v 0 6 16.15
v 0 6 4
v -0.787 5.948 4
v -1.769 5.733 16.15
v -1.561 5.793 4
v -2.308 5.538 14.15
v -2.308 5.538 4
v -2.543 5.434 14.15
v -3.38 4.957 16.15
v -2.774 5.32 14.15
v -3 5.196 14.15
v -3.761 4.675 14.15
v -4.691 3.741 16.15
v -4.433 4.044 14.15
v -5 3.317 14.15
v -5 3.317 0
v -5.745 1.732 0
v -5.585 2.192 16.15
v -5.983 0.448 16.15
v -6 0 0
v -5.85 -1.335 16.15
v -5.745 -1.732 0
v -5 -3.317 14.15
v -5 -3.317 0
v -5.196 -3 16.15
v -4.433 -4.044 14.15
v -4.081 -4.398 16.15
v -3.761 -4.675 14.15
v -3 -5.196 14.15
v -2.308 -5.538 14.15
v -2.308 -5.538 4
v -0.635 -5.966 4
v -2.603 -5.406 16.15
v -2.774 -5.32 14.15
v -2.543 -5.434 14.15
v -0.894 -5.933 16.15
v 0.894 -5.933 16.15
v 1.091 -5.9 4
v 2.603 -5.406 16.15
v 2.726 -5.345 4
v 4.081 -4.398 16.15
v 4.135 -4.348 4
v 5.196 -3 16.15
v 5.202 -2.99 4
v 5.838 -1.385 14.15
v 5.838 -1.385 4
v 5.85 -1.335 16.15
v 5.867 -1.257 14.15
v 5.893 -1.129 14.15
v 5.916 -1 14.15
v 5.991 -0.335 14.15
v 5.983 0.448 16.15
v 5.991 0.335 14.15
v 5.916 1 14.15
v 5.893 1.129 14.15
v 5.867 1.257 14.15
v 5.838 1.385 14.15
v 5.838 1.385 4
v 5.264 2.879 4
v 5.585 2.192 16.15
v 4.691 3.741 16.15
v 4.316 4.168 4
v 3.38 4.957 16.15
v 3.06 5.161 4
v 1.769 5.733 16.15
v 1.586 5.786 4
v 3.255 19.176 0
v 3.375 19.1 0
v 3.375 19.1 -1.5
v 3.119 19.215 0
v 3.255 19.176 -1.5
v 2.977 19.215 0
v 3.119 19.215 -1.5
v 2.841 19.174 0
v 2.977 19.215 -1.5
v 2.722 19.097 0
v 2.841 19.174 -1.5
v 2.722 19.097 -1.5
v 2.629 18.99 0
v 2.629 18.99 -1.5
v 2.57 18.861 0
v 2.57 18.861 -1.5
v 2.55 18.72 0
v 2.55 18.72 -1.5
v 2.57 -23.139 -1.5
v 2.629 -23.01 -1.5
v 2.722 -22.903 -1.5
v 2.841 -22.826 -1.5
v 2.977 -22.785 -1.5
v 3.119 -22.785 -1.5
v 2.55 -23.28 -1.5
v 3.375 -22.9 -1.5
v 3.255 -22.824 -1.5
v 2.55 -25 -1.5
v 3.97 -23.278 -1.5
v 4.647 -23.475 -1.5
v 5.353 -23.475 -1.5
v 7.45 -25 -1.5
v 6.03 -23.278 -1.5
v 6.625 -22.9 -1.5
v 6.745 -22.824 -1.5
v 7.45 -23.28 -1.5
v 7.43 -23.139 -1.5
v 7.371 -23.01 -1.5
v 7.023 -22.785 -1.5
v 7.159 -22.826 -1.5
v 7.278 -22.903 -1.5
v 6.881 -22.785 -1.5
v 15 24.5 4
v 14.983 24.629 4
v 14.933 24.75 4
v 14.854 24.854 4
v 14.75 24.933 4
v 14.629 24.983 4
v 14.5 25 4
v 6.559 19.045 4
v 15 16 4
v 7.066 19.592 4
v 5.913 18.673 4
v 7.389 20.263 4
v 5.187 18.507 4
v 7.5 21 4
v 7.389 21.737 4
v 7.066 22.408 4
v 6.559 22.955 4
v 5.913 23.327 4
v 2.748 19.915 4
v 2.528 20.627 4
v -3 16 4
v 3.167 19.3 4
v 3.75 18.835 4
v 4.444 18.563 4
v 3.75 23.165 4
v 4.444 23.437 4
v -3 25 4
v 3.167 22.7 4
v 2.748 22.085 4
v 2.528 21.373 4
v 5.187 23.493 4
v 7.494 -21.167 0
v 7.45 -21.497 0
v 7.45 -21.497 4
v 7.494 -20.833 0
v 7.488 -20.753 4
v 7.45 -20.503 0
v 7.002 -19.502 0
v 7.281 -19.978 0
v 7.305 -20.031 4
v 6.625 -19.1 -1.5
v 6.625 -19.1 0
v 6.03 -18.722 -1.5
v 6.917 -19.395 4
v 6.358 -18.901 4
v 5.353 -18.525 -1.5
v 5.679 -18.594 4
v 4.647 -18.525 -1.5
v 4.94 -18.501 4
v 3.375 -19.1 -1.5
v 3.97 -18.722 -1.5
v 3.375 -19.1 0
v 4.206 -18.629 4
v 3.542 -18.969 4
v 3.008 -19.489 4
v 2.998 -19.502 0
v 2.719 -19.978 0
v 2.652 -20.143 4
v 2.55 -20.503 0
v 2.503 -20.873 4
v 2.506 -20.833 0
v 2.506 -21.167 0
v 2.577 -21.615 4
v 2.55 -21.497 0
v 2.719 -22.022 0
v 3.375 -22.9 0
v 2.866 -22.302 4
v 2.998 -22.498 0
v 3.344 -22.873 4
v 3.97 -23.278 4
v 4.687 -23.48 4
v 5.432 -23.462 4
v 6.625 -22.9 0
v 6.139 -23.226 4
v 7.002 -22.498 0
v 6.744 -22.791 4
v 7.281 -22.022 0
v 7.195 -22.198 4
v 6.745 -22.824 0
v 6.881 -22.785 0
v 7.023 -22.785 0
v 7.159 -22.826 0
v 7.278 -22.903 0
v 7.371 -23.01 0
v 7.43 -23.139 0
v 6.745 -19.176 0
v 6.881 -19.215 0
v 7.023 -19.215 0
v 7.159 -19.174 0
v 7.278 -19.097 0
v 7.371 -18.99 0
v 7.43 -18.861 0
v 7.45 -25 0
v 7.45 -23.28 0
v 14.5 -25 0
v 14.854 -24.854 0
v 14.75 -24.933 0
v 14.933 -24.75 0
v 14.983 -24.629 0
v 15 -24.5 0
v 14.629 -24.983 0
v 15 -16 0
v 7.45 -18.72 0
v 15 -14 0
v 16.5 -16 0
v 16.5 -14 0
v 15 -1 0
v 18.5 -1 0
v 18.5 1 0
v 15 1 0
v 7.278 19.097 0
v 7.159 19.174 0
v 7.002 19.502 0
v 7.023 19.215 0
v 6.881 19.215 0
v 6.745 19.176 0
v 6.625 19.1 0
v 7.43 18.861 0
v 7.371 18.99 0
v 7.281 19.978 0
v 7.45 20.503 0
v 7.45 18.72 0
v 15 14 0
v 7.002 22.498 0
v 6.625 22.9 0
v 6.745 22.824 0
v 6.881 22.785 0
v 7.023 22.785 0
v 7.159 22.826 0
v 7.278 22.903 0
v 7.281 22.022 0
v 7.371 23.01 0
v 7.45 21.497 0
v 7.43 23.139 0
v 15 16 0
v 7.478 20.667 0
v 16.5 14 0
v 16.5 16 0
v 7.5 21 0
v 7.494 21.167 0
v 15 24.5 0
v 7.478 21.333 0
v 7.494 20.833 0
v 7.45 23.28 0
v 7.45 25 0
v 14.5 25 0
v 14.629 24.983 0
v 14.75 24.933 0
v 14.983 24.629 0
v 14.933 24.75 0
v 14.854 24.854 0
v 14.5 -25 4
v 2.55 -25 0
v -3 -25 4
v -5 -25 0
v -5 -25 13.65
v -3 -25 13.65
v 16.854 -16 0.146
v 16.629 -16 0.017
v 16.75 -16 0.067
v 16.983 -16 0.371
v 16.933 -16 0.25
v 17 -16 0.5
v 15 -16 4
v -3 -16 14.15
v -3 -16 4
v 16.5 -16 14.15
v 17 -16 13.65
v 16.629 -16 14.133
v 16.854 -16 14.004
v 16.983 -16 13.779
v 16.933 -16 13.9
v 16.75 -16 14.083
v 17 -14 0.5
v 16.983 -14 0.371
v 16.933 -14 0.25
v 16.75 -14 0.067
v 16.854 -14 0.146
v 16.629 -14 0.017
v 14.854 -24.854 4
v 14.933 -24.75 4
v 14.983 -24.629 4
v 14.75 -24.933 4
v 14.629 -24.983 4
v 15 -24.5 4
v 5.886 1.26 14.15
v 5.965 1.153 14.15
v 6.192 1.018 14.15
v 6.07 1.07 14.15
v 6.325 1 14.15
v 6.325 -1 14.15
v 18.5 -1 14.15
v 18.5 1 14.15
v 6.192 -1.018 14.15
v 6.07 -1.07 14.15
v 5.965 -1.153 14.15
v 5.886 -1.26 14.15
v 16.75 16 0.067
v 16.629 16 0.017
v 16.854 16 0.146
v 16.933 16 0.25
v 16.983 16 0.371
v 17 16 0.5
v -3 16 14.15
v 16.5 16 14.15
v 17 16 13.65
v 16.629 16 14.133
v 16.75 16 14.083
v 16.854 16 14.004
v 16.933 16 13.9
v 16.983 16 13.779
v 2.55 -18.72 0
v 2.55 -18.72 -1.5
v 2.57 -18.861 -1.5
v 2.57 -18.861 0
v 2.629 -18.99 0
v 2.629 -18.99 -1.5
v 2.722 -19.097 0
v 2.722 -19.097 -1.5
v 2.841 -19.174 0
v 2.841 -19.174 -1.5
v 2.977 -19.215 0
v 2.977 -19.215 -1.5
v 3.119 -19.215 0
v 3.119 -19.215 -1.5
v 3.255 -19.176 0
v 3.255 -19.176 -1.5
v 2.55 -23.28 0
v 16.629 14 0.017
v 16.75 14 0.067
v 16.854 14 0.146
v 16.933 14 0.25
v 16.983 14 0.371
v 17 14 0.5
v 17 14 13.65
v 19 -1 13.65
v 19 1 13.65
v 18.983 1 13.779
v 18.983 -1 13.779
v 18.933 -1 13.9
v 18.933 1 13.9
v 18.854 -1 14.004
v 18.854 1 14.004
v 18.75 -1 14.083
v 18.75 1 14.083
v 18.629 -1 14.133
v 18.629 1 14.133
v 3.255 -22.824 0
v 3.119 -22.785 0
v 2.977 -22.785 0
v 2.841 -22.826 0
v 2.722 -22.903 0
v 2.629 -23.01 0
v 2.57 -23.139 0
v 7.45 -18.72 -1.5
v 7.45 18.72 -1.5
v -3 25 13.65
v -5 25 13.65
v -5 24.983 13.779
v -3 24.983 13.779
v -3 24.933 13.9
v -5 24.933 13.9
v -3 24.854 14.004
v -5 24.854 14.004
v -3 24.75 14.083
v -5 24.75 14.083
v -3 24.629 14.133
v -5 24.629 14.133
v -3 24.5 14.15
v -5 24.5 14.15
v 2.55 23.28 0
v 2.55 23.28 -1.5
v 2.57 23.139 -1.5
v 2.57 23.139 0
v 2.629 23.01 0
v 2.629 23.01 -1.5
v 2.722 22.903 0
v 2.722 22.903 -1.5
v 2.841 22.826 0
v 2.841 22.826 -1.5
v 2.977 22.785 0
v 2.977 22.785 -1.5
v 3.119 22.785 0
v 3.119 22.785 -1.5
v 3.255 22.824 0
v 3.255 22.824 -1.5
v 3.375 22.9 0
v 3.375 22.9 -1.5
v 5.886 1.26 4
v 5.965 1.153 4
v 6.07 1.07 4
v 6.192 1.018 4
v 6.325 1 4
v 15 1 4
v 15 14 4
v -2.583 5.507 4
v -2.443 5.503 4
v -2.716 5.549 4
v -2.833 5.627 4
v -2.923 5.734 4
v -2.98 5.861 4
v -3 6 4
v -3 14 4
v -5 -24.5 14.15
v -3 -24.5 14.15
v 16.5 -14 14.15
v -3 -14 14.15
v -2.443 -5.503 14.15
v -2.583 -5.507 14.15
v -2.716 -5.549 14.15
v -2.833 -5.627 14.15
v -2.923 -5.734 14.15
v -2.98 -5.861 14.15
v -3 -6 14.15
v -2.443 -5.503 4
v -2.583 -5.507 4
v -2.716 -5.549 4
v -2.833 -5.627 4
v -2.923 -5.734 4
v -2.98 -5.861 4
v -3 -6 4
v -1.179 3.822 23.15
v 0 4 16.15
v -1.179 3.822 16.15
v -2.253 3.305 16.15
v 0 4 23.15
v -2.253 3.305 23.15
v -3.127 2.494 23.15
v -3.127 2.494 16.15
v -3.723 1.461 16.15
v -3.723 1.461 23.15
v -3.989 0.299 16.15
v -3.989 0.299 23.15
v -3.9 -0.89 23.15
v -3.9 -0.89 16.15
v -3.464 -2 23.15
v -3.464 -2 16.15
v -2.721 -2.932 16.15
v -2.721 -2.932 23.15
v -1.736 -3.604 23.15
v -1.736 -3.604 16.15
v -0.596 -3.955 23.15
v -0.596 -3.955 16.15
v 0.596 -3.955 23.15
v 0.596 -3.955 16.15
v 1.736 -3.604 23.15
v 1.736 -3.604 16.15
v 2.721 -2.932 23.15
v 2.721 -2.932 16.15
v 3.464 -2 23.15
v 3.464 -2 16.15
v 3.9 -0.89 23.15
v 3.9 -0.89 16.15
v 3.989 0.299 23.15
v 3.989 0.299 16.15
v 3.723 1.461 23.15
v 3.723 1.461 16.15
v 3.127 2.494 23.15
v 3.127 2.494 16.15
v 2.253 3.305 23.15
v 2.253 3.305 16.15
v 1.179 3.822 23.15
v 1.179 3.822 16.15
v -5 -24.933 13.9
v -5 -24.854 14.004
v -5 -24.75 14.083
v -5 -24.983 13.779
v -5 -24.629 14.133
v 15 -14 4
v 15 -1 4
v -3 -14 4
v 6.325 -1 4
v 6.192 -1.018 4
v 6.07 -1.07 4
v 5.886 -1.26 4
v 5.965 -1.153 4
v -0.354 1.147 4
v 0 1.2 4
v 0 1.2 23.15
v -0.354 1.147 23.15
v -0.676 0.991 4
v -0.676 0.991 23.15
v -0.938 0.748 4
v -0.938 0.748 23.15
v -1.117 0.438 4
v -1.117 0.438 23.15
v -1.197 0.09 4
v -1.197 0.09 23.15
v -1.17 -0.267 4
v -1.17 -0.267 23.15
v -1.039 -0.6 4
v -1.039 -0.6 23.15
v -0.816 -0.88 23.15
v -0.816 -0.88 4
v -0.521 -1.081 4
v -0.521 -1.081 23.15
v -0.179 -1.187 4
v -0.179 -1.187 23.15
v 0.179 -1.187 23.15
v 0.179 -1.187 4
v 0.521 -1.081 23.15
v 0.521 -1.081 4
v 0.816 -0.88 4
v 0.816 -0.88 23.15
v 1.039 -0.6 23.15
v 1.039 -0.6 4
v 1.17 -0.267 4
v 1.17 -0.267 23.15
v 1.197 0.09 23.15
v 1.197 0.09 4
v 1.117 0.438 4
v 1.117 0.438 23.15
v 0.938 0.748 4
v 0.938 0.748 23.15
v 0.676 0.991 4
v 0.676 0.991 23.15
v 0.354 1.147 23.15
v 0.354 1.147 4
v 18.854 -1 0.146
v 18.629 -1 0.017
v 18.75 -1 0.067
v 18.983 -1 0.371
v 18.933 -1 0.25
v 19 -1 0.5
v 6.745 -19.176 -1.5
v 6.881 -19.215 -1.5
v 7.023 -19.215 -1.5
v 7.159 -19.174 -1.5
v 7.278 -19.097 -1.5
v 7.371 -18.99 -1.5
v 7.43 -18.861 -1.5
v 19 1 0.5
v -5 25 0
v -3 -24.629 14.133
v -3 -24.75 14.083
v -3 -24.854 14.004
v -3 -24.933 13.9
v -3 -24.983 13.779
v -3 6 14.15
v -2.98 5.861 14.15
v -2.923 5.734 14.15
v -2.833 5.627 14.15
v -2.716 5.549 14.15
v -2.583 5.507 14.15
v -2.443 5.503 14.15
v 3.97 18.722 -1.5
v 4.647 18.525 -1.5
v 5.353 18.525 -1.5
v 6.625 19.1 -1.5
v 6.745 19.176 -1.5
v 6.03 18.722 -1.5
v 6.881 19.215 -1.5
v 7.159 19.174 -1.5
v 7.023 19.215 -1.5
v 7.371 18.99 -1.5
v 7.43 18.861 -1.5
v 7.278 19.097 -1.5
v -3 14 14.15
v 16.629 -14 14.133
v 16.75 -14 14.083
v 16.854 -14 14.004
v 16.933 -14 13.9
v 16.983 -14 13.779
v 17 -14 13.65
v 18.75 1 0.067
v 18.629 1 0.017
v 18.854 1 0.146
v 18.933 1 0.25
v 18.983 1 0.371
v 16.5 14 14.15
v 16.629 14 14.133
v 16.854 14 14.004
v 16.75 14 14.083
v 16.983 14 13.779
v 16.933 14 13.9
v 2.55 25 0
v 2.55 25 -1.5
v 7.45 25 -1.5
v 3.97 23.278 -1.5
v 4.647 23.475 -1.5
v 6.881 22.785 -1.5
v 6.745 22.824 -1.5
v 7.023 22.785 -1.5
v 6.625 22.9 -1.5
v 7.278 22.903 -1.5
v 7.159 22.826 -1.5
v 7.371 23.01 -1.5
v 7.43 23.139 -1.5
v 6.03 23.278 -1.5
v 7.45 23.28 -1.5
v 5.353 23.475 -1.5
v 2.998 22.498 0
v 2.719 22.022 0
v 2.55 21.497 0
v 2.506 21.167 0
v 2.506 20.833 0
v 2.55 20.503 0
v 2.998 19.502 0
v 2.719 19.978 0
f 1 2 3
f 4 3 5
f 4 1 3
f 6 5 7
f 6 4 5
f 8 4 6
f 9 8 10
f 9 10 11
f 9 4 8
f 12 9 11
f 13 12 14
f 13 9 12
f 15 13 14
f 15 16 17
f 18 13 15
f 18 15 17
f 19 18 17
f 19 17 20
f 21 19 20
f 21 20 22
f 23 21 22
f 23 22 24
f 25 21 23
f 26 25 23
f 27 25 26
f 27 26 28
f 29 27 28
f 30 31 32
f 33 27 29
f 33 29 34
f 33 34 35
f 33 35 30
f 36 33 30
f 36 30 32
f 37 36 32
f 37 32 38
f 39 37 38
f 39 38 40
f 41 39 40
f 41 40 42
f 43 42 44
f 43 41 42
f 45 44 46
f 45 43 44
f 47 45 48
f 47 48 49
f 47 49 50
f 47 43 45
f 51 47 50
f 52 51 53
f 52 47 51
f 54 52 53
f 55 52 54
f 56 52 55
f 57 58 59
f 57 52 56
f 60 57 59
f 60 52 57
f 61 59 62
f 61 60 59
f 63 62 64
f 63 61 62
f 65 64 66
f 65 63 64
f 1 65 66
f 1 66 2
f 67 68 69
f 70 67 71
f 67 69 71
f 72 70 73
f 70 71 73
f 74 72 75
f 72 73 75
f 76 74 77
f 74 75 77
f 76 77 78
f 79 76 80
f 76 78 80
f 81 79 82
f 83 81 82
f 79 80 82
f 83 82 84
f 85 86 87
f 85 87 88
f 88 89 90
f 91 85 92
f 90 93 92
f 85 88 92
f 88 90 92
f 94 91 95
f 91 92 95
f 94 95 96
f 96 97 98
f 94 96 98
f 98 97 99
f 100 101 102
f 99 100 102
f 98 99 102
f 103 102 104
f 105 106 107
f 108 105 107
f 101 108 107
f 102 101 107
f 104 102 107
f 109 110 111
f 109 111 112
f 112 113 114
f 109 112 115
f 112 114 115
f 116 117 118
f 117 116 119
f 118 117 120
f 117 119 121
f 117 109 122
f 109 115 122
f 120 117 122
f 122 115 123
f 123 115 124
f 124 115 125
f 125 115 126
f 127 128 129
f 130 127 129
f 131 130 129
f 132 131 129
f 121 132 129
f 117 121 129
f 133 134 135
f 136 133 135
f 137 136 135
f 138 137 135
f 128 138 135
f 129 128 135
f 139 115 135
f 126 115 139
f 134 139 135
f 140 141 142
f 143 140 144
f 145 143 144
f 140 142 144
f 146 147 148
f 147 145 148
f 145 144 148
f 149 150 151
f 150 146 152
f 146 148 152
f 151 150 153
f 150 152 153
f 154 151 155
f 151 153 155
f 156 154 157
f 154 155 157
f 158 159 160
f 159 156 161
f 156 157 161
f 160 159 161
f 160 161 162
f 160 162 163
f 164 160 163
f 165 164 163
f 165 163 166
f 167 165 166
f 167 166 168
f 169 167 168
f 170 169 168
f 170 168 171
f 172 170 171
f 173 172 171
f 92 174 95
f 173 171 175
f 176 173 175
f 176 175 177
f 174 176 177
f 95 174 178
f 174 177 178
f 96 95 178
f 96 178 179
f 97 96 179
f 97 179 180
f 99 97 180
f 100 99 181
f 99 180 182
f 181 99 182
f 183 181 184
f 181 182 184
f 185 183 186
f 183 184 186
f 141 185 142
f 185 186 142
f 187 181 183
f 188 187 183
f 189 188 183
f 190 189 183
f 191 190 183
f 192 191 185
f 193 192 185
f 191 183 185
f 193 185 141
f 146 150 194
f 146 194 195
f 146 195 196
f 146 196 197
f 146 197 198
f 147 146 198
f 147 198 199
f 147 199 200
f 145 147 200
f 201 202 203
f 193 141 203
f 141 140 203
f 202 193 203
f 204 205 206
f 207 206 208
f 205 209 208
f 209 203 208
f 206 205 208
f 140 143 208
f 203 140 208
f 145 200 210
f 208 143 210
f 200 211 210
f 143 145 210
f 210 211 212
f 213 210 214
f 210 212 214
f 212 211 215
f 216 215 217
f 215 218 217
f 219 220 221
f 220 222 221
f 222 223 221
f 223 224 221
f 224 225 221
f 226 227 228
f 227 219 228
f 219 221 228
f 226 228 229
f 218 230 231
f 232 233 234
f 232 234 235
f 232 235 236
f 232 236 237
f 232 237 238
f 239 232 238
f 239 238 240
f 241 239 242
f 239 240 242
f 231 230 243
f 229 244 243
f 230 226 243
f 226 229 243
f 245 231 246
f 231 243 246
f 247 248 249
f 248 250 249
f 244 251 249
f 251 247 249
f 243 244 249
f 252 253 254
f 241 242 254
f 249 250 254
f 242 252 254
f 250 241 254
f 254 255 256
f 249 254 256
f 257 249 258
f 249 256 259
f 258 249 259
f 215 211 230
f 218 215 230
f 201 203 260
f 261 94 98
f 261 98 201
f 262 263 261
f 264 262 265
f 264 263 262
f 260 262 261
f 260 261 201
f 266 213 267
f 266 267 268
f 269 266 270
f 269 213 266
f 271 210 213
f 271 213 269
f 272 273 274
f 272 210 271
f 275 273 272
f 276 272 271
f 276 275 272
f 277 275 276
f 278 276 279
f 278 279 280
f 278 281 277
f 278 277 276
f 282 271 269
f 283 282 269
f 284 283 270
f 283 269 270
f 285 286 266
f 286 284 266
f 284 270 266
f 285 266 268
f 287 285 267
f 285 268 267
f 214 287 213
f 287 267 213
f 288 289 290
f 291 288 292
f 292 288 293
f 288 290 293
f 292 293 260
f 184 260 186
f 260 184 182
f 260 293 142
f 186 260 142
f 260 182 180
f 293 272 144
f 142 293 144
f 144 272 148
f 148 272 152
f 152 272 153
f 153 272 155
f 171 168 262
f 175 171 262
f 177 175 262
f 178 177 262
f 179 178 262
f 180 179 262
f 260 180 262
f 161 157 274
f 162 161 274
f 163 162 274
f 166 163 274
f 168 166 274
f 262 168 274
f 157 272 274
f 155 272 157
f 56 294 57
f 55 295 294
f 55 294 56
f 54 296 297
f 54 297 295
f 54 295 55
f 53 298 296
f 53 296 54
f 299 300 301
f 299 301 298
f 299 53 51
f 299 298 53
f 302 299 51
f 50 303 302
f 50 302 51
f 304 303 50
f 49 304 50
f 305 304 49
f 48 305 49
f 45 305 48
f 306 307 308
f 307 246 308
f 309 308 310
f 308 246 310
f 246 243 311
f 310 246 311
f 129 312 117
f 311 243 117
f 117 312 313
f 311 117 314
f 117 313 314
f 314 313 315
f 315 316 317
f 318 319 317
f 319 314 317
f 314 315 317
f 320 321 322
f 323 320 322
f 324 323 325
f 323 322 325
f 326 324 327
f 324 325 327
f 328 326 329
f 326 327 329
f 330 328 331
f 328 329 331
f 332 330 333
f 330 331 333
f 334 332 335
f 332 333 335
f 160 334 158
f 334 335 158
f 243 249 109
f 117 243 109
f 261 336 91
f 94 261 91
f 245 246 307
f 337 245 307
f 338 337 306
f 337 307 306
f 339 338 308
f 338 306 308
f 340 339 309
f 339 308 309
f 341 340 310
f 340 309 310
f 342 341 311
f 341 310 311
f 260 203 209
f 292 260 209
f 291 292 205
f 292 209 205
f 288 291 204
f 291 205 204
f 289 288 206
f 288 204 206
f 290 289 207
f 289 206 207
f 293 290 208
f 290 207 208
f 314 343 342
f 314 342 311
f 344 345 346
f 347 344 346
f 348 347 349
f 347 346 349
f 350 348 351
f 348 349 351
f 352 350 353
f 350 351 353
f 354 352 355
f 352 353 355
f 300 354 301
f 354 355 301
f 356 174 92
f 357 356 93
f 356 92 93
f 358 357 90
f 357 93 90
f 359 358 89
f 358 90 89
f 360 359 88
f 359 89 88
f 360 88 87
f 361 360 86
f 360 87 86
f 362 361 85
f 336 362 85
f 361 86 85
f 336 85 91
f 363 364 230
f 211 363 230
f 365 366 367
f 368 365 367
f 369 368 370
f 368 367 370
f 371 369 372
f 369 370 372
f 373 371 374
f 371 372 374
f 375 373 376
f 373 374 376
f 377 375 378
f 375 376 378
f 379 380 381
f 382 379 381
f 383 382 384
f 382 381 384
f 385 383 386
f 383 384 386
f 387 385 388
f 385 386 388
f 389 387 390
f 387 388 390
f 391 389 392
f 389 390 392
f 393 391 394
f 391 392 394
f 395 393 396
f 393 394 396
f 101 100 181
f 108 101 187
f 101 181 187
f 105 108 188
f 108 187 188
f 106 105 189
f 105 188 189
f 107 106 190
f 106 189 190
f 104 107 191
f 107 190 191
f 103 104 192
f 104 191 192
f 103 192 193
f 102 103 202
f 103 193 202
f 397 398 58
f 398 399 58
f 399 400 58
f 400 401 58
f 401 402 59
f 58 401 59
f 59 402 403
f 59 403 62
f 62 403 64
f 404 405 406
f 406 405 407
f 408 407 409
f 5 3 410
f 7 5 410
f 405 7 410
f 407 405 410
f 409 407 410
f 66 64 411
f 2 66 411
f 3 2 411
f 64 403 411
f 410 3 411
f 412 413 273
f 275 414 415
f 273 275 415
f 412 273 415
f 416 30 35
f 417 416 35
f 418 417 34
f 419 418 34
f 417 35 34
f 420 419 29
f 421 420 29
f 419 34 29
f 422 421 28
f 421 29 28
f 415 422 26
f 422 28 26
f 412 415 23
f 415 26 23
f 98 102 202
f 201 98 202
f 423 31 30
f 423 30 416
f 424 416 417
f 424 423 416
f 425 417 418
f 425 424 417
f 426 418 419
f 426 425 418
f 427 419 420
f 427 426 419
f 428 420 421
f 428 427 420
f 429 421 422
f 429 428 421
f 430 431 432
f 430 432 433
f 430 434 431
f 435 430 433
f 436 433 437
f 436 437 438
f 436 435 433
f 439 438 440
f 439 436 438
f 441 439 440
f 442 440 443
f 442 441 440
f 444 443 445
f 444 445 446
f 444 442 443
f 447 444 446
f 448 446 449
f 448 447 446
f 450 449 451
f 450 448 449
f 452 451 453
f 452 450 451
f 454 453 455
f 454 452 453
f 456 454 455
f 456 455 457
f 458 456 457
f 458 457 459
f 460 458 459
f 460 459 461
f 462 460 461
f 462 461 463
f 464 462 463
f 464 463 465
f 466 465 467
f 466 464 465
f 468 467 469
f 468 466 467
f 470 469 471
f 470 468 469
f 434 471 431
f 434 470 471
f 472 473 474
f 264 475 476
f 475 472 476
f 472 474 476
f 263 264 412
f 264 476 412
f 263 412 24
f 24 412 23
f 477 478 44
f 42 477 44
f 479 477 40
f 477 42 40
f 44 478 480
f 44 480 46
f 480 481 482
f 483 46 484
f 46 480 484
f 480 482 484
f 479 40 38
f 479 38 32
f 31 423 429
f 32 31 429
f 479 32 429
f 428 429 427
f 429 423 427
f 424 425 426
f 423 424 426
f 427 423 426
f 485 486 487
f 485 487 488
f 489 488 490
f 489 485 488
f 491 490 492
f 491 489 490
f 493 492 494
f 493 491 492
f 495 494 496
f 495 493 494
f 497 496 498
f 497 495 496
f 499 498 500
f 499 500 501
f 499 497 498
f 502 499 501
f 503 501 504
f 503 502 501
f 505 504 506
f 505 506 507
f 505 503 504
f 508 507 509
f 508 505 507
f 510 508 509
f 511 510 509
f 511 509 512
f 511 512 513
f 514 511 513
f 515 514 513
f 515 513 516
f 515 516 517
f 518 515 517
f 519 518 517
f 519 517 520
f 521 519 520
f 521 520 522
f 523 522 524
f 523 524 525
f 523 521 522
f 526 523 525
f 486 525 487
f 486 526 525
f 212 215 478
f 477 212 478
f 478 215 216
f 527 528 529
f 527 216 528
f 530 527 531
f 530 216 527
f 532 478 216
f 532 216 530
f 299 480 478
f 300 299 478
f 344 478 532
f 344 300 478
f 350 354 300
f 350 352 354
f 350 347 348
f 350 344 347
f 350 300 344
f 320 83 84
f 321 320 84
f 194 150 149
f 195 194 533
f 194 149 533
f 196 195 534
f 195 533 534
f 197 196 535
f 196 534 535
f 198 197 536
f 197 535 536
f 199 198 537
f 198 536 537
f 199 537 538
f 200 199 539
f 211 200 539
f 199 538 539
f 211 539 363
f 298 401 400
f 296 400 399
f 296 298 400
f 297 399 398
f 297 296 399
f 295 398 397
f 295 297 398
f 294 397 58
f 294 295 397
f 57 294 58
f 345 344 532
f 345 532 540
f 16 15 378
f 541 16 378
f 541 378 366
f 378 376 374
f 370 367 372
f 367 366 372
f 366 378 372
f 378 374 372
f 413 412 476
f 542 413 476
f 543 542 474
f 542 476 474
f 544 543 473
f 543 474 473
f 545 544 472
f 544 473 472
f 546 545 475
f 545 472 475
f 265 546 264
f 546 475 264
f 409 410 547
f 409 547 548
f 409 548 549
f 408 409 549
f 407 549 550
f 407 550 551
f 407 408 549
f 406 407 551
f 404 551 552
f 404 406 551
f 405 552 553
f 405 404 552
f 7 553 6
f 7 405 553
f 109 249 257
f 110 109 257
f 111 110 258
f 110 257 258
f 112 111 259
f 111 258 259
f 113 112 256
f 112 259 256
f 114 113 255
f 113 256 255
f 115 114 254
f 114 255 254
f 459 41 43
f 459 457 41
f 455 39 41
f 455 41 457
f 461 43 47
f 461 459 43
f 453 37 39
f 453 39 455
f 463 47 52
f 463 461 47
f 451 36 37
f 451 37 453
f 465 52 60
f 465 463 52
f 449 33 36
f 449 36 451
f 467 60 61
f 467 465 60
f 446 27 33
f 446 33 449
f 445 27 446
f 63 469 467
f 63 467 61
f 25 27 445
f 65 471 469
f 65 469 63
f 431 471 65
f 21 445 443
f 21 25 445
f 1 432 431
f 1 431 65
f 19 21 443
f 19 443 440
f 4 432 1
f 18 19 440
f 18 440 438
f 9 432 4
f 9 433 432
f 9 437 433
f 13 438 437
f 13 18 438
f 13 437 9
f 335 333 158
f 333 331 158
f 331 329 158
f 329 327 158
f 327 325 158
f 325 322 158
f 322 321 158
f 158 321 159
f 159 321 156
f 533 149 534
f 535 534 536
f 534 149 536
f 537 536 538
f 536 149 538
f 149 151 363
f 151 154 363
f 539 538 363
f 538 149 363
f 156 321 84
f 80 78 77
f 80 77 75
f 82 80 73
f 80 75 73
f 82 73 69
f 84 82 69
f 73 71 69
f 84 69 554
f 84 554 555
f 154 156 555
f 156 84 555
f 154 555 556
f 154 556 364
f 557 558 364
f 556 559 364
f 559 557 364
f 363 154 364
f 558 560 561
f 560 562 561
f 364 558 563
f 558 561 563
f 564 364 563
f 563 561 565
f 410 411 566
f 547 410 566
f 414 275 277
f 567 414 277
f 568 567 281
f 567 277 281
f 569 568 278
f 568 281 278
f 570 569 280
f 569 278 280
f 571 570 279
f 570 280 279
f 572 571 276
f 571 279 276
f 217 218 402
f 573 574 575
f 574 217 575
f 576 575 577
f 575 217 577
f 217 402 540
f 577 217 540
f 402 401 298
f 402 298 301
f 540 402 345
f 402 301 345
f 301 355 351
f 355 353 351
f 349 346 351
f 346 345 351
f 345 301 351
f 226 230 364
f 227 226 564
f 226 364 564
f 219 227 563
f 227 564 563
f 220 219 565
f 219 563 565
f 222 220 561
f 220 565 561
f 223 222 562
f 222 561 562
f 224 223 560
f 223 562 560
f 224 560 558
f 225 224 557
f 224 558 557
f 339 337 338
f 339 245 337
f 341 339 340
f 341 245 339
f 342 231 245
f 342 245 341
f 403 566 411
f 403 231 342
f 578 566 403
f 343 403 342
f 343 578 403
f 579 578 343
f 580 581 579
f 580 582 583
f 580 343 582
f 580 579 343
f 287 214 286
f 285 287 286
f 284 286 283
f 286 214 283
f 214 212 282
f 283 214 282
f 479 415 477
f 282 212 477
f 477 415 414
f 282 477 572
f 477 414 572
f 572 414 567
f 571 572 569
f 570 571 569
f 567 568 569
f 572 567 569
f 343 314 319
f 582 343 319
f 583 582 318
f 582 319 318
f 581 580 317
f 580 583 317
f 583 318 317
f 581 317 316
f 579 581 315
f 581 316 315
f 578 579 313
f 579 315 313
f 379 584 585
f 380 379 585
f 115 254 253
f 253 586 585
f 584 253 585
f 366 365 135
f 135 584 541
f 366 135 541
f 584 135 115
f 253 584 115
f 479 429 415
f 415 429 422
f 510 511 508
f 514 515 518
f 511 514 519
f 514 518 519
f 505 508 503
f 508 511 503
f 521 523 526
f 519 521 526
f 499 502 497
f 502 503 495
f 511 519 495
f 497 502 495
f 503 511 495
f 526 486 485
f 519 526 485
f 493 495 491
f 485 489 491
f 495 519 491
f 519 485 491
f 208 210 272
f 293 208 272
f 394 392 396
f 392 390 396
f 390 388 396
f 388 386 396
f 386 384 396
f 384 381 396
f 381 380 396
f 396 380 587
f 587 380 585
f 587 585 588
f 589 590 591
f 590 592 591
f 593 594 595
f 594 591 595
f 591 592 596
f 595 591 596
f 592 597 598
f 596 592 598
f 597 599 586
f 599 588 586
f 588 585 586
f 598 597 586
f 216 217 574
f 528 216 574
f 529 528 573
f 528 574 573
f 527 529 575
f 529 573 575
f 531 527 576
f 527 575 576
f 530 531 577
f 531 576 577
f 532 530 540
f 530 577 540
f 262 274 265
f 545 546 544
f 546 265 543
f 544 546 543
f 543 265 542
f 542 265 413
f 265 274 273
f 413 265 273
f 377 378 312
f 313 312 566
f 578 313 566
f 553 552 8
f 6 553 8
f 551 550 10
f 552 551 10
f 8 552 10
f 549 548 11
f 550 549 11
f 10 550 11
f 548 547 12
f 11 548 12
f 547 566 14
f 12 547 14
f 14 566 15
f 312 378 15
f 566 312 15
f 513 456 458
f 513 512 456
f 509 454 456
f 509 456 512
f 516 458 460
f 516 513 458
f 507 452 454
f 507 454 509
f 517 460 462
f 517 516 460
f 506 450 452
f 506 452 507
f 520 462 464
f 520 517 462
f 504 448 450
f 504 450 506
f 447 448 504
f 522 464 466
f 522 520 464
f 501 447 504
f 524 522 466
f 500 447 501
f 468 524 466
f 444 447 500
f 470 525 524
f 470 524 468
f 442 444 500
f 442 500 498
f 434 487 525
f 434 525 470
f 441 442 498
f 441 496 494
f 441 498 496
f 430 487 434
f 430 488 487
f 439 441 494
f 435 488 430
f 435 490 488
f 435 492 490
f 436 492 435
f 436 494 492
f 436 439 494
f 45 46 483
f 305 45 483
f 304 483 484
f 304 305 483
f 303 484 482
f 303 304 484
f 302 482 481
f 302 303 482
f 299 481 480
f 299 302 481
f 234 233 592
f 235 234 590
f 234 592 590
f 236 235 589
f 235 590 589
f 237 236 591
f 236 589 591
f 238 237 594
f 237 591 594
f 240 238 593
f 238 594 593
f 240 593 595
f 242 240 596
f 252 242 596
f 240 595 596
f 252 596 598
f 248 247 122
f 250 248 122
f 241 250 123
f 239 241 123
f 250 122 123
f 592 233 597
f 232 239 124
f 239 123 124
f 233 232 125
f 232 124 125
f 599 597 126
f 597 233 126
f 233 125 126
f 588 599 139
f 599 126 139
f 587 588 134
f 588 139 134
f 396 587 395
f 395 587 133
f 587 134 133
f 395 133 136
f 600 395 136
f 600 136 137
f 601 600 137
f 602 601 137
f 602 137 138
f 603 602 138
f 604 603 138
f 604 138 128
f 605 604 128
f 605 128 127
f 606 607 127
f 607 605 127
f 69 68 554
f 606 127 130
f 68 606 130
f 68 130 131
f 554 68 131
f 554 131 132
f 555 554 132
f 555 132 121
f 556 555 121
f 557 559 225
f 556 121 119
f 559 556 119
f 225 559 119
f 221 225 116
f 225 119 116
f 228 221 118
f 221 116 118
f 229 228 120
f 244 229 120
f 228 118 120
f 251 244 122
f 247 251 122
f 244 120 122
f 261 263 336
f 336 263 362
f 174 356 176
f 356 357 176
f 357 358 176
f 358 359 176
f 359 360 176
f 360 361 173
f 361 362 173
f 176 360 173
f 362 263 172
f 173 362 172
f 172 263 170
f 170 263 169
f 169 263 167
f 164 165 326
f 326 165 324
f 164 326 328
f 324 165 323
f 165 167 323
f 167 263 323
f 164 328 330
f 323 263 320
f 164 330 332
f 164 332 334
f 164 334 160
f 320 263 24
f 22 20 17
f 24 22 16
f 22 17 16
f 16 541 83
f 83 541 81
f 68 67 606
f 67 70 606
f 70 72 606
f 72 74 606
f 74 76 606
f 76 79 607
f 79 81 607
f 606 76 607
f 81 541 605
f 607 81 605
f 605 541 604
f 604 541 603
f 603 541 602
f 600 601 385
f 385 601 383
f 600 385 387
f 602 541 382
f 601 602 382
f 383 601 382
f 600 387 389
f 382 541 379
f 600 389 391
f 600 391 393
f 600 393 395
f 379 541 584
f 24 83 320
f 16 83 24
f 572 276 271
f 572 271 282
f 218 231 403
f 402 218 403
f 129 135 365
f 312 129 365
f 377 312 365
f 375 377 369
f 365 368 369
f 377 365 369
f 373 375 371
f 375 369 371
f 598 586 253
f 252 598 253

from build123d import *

# Parameters (mm, degrees)
BOSS_EXTRU_1_DEPTH      = 25
ESQUISSE5_W             = 10.15
ESQUISSE5_H             = 50
BOSS_EXTRU_2_DEPTH      = 2
BOSS_EXTRU_3_REACH      = 35.09
ESQUISSE6_W             = 22
ESQUISSE6_H             = 2
ESQUISSE6_W_2           = 13.083920217
ESQUISSE7_R             = 2.5
ENL_V_MAT_EXTRU_1_DEPTH = 37.779376014
CONG_1_R                = 0.5


with BuildPart() as part:
    # Esquisse1 → Boss.-Extru.1 (new, symmetric)
    with BuildSketch(Plane(origin=(0, 0, 0), x_dir=(1, 0, 0), z_dir=(0, 1, 0))):
        Polygon((7.45, 0), (15, 0), (15, -4), (-5, -4), (-5, 0), (2.55, 0), (2.55, 1.5), (7.45, 1.5), align=None)
    extrude(amount=BOSS_EXTRU_1_DEPTH, both=True)

    # Esquisse3 → Révolution1 (revolve)
    with BuildSketch(Plane(origin=(0, 0, 0), x_dir=(0, 0, -1), z_dir=(1, 0, 0))):
        Polygon((0, 6), (-16.15, 6), (-16.15, 4), (-23.15, 4), (-23.15, 1.2), (0, 1.2), align=None)
    revolve(axis=Axis((0, 0, 0), (0, 0, 1)))

    # Esquisse5 → Boss.-Extru.2 (add)
    with BuildSketch(Plane.ZY.offset(5)):
        with Locations((9.075, 0)):
            Rectangle(ESQUISSE5_W, ESQUISSE5_H)
    extrude(amount=-BOSS_EXTRU_2_DEPTH)

    # Boss.-Extru.3: up to this face of the body (flat: up to its plane)
    boss_extru_3_end = Plane(part.part.faces().sort_by_distance((11.225, 0, 0))[0])
    # Esquisse6 → Boss.-Extru.3 (add, up to the picked face)
    with BuildSketch(Plane.XY.offset(14.15), mode=Mode.PRIVATE) as boss_extru_3_sk1:
        with Locations((6, 15)):
            Rectangle(ESQUISSE6_W, ESQUISSE6_H)
    boss_extru_3_tool1 = split(extrude(boss_extru_3_sk1.sketch, amount=-BOSS_EXTRU_3_REACH, mode=Mode.PRIVATE), bisect_by=boss_extru_3_end, keep=Keep.BOTH, mode=Mode.PRIVATE)
    # Esquisse6 → Boss.-Extru.3 (add, up to the picked face)
    with BuildSketch(Plane.XY.offset(14.15), mode=Mode.PRIVATE) as boss_extru_3_sk2:
        with Locations((6, -15)):
            Rectangle(ESQUISSE6_W, ESQUISSE6_H)
    boss_extru_3_tool2 = split(extrude(boss_extru_3_sk2.sketch, amount=-BOSS_EXTRU_3_REACH, mode=Mode.PRIVATE), bisect_by=boss_extru_3_end, keep=Keep.BOTH, mode=Mode.PRIVATE)
    # Esquisse6 → Boss.-Extru.3 (add, up to the picked face)
    with BuildSketch(Plane.XY.offset(14.15), mode=Mode.PRIVATE) as boss_extru_3_sk3:
        with Locations((12.458039892, 0)):
            Rectangle(ESQUISSE6_W_2, ESQUISSE6_H)
    boss_extru_3_tool3 = split(extrude(boss_extru_3_sk3.sketch, amount=-BOSS_EXTRU_3_REACH, mode=Mode.PRIVATE), bisect_by=boss_extru_3_end, keep=Keep.BOTH, mode=Mode.PRIVATE)
    add(boss_extru_3_tool1.solids().sort_by(Axis((6, 15, 14.15), (0, 0, -1)))[0])
    add(boss_extru_3_tool2.solids().sort_by(Axis((6, -15, 14.15), (0, 0, -1)))[0])
    add(boss_extru_3_tool3.solids().sort_by(Axis((12.45804, 0, 14.15), (0, 0, -1)))[0])

    # Esquisse7 → Enlèv. mat.-Extru.1 (cut, through all)
    with BuildSketch(Plane.XY.offset(4)):
        with Locations((5, 21)):
            Circle(ESQUISSE7_R)
        with Locations(Location((5, -21, 0), (0, 0, 348.521659045))):
            Circle(ESQUISSE7_R)
    extrude(amount=-ENL_V_MAT_EXTRU_1_DEPTH, mode=Mode.SUBTRACT)

    # Congé1
    # the kernel refuses this fillet: 0.5 mm, written as the material it adds along each edge
    with BuildSketch(Plane(origin=(5.916079783, 1, 14.15), x_dir=(1, 0, 0), z_dir=(0, 0, -1))) as cong_1_piece_1:
        with BuildLine():
            CenterArc((0.408475537, -0.5), CONG_1_R, 90, 76.657636203)
            ThreePointArc((-0.078028718, -0.384615385), (-0.035868882, -0.19294583), (0, 0))
            Line((0, 0), (0.408475537, 0))
        make_face()
    extrude(amount=11.171188843)
    with BuildSketch(Plane(origin=(5.916079783, -1, 14.15), x_dir=(1, 0, 0), z_dir=(0, 0, -1))) as cong_1_piece_2:
        with BuildLine():
            CenterArc((0.408475537, 0.5), CONG_1_R, 193.342363797, 76.657636203)
            ThreePointArc((-0.078028718, 0.384615385), (-0.035868882, 0.19294583), (0, 0))
            Line((0, 0), (0.408475537, 0))
        make_face()
    extrude(amount=11.171188843)
    with BuildSketch(Plane(origin=(-3, -5.196152423, 1.990381057), x_dir=(0.8964096085841841, -0.44322659401027603, 0), z_dir=(0, 0, 1))) as cong_1_piece_3:
        with BuildLine():
            CenterArc((0.804491428, -0.498963395), CONG_1_R, 93.690067526, 112.619864948)
            Line((0.356286624, -0.720576692), (0, 0))
            ThreePointArc((0, 0), (0.386155885, -0.012439259), (0.772311771, 0))
        make_face()
    extrude(amount=12.159618943)
    with BuildSketch(Plane(origin=(-3, 5.196152423, 1.990381057), x_dir=(0, 1, 0), z_dir=(0, 0, 1))) as cong_1_piece_4:
        with BuildLine():
            CenterArc((0.803847577, -0.5), CONG_1_R, 90, 112.619864948)
            ThreePointArc((0.342309116, -0.692307692), (0.182305229, -0.340640436), (0, 0))
            Line((0, 0), (0.803847577, 0))
        make_face()
    extrude(amount=12.159618943)
    # the kernel refuses this fillet: 0.5 mm, written as the material it takes off along each edge
    with BuildSketch(Plane(origin=(15, 25, -1.25), x_dir=(0, -1, 0), z_dir=(0, 0, 1)), Plane(origin=(15, -25, -1.25), x_dir=(-1, 0, 0), z_dir=(0, 0, 1))) as cong_1_2_piece_1:
        with BuildLine():
            CenterArc((CONG_1_R, -CONG_1_R), CONG_1_R, 90, 90)
            Line((0, -CONG_1_R), (0, 0))
            Line((0, 0), (CONG_1_R, 0))
        make_face()
    extrude(amount=6.5, mode=Mode.SUBTRACT)
    with BuildSketch(Plane(origin=(17, -17.25, 0), x_dir=(-1, 0, 0), z_dir=(0, 1, 0)), Plane(origin=(19, 2.25, 14.15), x_dir=(-1, 0, 0), z_dir=(0, -1, 0)), Plane(origin=(-6.25, 25, 14.15), x_dir=(0, -1, 0), z_dir=(1, 0, 0)), Plane(origin=(-6.25, -25, 14.15), x_dir=(0, 0, -1), z_dir=(1, 0, 0)), Plane(origin=(17, 17.25, 14.15), x_dir=(-1, 0, 0), z_dir=(0, -1, 0))) as cong_1_2_piece_2:
        with BuildLine():
            CenterArc((CONG_1_R, CONG_1_R), CONG_1_R, 180, 90)
            Line((0, CONG_1_R), (0, 0))
            Line((0, 0), (CONG_1_R, 0))
        make_face()
    extrude(amount=4.5, mode=Mode.SUBTRACT)
    with BuildSketch(Plane(origin=(17, -17.25, 14.15), x_dir=(-1, 0, 0), z_dir=(0, 1, 0)), Plane(origin=(19, 2.25, 0), x_dir=(-1, 0, 0), z_dir=(0, -1, 0)), Plane(origin=(17, 17.25, 0), x_dir=(-1, 0, 0), z_dir=(0, -1, 0))) as cong_1_2_piece_3:
        with BuildLine():
            CenterArc((CONG_1_R, -CONG_1_R), CONG_1_R, 90, 90)
            Line((0, -CONG_1_R), (0, 0))
            Line((0, 0), (CONG_1_R, 0))
        make_face()
    extrude(amount=4.5, mode=Mode.SUBTRACT)
    with BuildSketch(Plane(origin=(7.45, 20.502506281, -5.955772261), x_dir=(-0.5070626183882774, -0.8619092185568178, 0), z_dir=(0, 0, 1))) as cong_1_2_piece_4:
        with BuildLine():
            CenterArc((1.789719784, 0.472787611), CONG_1_R, 120.468369541, 130.541601874)
            Line((1.536188475, 0.90374222), (0, 0))
            ThreePointArc((0, 0), (0.813508993, 0.136061947), (1.627017986, 0))
        make_face()
    extrude(amount=5.955772261, mode=Mode.SUBTRACT)
    with BuildSketch(Plane(origin=(7.45, 21.497493719, -5.955772261), x_dir=(0, 1, 0), z_dir=(0, 0, 1)), Plane(origin=(2.55, 20.502506281, -5.955772261), x_dir=(0, -1, 0), z_dir=(0, 0, 1)), Plane(origin=(7.45, -20.502506281, -5.955772261), x_dir=(0, 1, 0), z_dir=(0, 0, 1)), Plane(origin=(2.55, -21.497493719, -5.955772261), x_dir=(0, -1, 0), z_dir=(0, 0, 1))) as cong_1_2_piece_5:
        with BuildLine():
            CenterArc((1.782308904, 0.5), CONG_1_R, 139.458398126, 130.541601874)
            ThreePointArc((1.402341801, 0.825), (0.770162827, 0.295226954), (0, 0))
            Line((0, 0), (1.782308904, 0))
        make_face()
    extrude(amount=5.955772261, mode=Mode.SUBTRACT)
    with BuildSketch(Plane(origin=(2.55, 21.497493719, -5.955772261), x_dir=(0, 1, 0), z_dir=(0, 0, 1)), Plane(origin=(2.55, -20.502506281, -5.955772261), x_dir=(0, 1, 0), z_dir=(0, 0, 1))) as cong_1_2_piece_6:
        with BuildLine():
            CenterArc((1.782308904, -0.5), CONG_1_R, 90, 130.541601874)
            ThreePointArc((1.402341801, -0.825), (0.770162827, -0.295226954), (0, 0))
            Line((0, 0), (1.782308904, 0))
        make_face()
    extrude(amount=5.955772261, mode=Mode.SUBTRACT)
    with BuildSketch(Plane(origin=(7.45, -21.497493719, 0), x_dir=(-0.507062618391788, -0.8619092185547524, 0), z_dir=(0, 0, -1))) as cong_1_2_piece_7:
        with BuildLine():
            CenterArc((1.789719784, -0.472787611), CONG_1_R, 108.990028586, 130.541601874)
            Line((1.536188475, -0.90374222), (0, 0))
            ThreePointArc((0, 0), (0.813508993, -0.136061947), (1.627017986, 0))
        make_face()
    extrude(amount=5.955772261, mode=Mode.SUBTRACT)


solid = part.part
